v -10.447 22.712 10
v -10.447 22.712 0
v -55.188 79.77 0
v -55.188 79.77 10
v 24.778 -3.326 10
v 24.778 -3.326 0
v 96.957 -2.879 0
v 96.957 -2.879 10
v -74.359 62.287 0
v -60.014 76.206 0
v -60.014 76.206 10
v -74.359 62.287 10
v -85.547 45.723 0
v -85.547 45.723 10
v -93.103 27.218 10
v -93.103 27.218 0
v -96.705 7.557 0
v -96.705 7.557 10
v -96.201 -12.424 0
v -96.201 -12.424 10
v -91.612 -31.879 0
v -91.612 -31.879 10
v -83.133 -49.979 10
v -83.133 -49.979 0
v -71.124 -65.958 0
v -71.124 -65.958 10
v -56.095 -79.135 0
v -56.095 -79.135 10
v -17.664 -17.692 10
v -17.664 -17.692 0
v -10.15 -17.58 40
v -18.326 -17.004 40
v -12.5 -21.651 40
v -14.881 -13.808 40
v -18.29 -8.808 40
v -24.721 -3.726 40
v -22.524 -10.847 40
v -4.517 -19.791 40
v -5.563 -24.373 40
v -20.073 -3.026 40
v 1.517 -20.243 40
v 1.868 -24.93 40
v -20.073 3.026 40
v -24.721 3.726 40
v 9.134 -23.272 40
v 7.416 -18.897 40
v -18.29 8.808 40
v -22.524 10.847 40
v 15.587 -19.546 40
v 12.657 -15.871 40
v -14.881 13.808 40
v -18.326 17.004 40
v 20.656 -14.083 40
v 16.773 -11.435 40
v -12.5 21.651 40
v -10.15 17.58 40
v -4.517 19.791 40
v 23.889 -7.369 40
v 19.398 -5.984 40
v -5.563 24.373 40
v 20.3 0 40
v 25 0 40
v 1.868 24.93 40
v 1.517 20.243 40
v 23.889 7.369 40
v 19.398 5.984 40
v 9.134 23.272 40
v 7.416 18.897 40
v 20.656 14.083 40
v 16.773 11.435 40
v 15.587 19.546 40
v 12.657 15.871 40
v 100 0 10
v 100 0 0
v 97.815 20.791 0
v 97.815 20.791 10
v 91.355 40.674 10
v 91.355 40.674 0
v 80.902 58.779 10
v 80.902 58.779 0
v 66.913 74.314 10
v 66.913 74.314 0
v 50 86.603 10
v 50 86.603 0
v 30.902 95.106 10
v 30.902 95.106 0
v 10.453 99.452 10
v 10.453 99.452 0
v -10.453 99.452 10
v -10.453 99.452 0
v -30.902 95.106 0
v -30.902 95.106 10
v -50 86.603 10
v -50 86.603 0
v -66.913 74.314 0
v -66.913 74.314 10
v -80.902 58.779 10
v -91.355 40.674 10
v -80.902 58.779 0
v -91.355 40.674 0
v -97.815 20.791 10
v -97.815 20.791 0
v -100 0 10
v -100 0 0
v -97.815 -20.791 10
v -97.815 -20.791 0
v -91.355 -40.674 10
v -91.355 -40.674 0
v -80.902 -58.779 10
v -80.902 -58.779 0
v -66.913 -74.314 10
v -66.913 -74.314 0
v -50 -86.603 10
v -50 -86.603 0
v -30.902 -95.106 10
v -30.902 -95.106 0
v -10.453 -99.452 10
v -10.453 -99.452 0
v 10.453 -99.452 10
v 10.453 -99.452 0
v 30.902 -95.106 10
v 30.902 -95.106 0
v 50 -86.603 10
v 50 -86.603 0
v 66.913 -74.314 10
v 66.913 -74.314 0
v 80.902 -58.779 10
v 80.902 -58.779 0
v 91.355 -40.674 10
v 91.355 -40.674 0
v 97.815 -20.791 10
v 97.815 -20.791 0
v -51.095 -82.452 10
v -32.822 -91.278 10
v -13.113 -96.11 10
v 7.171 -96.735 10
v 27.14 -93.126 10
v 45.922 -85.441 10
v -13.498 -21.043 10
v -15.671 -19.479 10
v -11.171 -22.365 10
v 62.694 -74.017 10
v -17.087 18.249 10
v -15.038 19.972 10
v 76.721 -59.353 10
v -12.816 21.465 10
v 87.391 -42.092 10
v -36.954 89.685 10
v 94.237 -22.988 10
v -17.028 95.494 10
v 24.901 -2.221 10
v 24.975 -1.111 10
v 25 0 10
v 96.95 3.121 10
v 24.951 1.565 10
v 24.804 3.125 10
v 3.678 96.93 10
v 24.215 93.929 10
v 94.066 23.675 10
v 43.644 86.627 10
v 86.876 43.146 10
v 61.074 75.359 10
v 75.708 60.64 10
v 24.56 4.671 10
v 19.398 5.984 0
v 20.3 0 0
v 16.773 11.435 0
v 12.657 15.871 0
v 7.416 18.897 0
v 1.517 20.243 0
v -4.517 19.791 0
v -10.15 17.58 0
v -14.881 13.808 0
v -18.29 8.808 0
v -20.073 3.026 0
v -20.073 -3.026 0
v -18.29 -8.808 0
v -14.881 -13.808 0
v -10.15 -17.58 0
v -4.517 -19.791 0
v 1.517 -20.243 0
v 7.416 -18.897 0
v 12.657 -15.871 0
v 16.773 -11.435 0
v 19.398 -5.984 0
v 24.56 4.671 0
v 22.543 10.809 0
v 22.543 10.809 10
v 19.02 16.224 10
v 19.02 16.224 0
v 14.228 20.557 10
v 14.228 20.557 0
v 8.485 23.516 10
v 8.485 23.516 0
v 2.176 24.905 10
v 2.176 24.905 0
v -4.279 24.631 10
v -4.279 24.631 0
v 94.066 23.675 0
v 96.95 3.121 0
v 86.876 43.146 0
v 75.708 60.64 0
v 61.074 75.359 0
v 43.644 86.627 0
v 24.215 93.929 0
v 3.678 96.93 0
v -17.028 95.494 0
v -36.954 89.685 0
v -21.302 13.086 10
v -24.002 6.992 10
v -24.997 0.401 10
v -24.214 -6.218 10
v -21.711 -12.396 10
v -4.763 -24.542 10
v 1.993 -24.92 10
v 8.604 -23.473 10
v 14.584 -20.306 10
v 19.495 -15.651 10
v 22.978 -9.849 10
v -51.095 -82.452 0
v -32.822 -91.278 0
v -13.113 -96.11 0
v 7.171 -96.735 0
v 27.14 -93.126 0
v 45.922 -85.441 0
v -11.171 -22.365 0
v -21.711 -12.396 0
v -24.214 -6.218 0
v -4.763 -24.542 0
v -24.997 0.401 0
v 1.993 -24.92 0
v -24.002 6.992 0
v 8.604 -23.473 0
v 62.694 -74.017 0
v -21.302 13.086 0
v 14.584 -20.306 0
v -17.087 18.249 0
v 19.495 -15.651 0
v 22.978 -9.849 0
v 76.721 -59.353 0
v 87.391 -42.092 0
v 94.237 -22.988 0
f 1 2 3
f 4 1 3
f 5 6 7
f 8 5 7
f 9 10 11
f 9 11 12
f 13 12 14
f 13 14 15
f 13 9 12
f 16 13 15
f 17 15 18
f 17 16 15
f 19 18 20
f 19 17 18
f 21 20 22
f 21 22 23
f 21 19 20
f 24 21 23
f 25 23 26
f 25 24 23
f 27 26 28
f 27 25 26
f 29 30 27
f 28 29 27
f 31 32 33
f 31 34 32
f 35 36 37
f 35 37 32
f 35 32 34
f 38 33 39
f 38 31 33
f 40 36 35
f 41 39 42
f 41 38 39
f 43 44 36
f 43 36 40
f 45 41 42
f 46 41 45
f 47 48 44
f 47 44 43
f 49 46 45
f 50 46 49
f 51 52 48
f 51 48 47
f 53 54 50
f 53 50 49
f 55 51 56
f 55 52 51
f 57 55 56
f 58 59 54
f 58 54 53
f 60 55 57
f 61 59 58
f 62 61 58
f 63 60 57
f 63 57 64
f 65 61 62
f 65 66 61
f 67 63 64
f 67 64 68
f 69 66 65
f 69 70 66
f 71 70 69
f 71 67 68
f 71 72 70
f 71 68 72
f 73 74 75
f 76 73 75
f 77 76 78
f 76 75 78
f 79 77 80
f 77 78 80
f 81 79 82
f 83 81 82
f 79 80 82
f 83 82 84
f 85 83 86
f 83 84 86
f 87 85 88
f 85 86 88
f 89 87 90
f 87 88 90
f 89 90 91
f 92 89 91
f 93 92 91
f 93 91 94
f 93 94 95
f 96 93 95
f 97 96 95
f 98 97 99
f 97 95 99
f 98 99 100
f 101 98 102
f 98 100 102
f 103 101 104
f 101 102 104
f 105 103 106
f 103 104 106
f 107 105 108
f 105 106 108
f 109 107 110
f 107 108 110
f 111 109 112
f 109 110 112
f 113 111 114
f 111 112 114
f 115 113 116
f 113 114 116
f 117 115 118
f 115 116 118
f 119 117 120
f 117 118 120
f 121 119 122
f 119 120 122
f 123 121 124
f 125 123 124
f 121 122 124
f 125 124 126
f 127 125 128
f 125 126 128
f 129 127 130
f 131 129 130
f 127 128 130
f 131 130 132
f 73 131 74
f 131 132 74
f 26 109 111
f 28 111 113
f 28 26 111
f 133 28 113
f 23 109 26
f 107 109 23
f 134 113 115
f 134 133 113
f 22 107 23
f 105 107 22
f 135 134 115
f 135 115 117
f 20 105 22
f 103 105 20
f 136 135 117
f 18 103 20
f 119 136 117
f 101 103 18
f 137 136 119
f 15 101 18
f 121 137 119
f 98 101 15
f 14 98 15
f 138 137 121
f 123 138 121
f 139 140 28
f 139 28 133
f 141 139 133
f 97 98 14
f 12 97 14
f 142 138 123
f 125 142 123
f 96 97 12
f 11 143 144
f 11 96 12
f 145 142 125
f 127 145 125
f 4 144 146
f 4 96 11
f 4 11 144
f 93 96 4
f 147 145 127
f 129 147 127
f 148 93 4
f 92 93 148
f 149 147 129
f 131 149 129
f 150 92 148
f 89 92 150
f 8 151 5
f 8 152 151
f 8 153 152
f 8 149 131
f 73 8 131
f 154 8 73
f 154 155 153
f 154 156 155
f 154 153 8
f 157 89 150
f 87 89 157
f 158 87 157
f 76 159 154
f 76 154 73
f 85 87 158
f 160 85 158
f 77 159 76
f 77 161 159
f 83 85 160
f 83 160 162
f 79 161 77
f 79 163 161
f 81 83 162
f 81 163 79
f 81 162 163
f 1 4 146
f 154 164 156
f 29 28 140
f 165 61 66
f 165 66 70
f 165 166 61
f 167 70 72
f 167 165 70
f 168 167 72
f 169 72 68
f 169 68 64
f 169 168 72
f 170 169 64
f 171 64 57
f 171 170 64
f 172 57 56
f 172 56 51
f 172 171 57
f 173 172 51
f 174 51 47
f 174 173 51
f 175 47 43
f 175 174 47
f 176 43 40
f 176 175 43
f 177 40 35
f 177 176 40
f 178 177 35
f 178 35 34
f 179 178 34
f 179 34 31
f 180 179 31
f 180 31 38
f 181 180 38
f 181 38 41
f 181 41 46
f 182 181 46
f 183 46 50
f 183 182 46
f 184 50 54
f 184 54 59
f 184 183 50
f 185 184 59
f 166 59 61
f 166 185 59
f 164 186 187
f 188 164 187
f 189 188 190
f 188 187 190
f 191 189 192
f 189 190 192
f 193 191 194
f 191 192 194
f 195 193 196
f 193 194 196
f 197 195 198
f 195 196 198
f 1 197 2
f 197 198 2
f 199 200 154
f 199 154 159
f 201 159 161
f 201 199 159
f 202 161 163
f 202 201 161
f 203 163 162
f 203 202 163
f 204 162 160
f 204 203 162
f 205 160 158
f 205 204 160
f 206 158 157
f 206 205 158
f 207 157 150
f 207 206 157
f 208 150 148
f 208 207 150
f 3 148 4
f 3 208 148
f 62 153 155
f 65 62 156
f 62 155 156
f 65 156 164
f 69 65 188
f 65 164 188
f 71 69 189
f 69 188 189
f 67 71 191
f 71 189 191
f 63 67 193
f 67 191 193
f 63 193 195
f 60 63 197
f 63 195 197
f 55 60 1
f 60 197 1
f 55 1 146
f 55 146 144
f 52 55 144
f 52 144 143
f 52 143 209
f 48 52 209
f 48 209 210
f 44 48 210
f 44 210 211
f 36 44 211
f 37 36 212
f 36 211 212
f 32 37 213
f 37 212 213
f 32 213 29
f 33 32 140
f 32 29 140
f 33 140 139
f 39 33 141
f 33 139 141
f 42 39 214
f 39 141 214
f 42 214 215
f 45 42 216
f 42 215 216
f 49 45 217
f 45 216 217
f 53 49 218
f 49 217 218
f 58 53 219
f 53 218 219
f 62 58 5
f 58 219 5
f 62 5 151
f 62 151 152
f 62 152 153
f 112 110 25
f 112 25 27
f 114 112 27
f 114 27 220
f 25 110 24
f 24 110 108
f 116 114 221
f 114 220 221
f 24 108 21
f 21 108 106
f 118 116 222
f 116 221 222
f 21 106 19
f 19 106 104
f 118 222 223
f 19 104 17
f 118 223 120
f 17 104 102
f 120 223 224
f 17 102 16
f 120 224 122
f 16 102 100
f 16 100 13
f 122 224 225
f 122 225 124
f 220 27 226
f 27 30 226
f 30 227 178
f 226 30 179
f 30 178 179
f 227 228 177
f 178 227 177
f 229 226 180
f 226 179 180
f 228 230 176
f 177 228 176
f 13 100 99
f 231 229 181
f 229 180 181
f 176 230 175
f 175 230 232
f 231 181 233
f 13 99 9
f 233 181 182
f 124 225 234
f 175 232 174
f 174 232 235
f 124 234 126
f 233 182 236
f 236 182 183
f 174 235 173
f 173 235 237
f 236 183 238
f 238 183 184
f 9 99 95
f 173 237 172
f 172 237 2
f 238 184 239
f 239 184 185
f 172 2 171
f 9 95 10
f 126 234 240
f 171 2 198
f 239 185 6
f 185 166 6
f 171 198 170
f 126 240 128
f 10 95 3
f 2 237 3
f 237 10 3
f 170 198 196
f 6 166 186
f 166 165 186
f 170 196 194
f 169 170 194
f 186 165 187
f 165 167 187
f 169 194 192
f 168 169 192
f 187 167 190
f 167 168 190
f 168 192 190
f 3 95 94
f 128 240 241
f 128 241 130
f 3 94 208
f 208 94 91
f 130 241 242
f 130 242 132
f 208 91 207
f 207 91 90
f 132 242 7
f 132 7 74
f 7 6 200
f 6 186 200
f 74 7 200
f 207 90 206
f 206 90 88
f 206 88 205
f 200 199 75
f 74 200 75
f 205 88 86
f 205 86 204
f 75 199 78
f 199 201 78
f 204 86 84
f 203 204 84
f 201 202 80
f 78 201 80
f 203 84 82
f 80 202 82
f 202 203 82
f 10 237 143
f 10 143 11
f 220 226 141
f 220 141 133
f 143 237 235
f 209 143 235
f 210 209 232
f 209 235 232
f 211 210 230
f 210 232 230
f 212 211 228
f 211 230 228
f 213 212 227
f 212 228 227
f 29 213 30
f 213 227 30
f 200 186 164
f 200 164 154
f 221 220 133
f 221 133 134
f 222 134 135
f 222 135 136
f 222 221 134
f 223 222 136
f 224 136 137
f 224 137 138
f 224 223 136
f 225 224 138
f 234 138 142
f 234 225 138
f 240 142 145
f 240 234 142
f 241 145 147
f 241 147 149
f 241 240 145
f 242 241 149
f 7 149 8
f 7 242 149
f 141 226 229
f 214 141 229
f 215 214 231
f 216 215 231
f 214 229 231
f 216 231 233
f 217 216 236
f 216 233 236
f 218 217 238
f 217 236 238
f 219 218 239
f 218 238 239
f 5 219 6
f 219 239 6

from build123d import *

# Parameters (mm, degrees)
SKETCH_R      = 100
SKETCH_R_2    = 20.3
PAD_DEPTH     = 10
SKETCH001_R   = 25
SKETCH001_R_2 = 20.3
PAD001_DEPTH  = 30


with BuildPart() as part:
    # Sketch → Pad (new body)
    with BuildSketch(Plane.XY):
        Circle(SKETCH_R)
        Circle(SKETCH_R_2, mode=Mode.SUBTRACT)
        with BuildLine():
            ThreePointArc((96.9497657449, 3.1213654066), (43.6438596811, 86.6268636864), (-55.1876984138, 79.7704076948))
            Line((-10.4473324135, 22.7124028989), (-55.1876984138, 79.7704076948))
            ThreePointArc((24.5596676208, 4.6714801032), (11.4524331511, 22.2225510443), (-10.4473324135, 22.7124028989))
            Line((24.5596676208, 4.6714801032), (96.9497657449, 3.1213654066))
        make_face(mode=Mode.SUBTRACT)
        with BuildLine():
            Line((24.7778278361, -3.3255447261), (96.9572766219, -2.8786298923))
            ThreePointArc((-51.0948365642, -82.4519112967), (45.9218644045, -85.441104684), (96.9572766219, -2.8786298923))
            Line((-11.1707596696, -22.3654673192), (-51.0948365642, -82.4519112967))
            ThreePointArc((-11.1707596696, -22.3654673192), (11.701185372, -22.0925838437), (24.7778278361, -3.3255447261))
        make_face(mode=Mode.SUBTRACT)
        with BuildLine():
            Line((-17.6635634383, -17.6917643739), (-56.0947674063, -79.1351822493))
            ThreePointArc((-60.0140125025, 76.2057629274), (-96.9691420251, -2.4465271145), (-56.0947674063, -79.1351822493))
            Line((-17.0867647821, 18.2494512049), (-60.0140125025, 76.2057629274))
            ThreePointArc((-17.0867647821, 18.2494512049), (-24.9967812363, 0.401158102), (-17.6635634383, -17.6917643739))
        make_face(mode=Mode.SUBTRACT)
    extrude(amount=PAD_DEPTH)

    # Sketch001 (on Face16 of Pad) → Pad001 (join)
    with BuildSketch(Plane.XY.offset(10)):
        Circle(SKETCH001_R)
        Circle(SKETCH001_R_2, mode=Mode.SUBTRACT)
    extrude(amount=PAD001_DEPTH)


solid = part.part
